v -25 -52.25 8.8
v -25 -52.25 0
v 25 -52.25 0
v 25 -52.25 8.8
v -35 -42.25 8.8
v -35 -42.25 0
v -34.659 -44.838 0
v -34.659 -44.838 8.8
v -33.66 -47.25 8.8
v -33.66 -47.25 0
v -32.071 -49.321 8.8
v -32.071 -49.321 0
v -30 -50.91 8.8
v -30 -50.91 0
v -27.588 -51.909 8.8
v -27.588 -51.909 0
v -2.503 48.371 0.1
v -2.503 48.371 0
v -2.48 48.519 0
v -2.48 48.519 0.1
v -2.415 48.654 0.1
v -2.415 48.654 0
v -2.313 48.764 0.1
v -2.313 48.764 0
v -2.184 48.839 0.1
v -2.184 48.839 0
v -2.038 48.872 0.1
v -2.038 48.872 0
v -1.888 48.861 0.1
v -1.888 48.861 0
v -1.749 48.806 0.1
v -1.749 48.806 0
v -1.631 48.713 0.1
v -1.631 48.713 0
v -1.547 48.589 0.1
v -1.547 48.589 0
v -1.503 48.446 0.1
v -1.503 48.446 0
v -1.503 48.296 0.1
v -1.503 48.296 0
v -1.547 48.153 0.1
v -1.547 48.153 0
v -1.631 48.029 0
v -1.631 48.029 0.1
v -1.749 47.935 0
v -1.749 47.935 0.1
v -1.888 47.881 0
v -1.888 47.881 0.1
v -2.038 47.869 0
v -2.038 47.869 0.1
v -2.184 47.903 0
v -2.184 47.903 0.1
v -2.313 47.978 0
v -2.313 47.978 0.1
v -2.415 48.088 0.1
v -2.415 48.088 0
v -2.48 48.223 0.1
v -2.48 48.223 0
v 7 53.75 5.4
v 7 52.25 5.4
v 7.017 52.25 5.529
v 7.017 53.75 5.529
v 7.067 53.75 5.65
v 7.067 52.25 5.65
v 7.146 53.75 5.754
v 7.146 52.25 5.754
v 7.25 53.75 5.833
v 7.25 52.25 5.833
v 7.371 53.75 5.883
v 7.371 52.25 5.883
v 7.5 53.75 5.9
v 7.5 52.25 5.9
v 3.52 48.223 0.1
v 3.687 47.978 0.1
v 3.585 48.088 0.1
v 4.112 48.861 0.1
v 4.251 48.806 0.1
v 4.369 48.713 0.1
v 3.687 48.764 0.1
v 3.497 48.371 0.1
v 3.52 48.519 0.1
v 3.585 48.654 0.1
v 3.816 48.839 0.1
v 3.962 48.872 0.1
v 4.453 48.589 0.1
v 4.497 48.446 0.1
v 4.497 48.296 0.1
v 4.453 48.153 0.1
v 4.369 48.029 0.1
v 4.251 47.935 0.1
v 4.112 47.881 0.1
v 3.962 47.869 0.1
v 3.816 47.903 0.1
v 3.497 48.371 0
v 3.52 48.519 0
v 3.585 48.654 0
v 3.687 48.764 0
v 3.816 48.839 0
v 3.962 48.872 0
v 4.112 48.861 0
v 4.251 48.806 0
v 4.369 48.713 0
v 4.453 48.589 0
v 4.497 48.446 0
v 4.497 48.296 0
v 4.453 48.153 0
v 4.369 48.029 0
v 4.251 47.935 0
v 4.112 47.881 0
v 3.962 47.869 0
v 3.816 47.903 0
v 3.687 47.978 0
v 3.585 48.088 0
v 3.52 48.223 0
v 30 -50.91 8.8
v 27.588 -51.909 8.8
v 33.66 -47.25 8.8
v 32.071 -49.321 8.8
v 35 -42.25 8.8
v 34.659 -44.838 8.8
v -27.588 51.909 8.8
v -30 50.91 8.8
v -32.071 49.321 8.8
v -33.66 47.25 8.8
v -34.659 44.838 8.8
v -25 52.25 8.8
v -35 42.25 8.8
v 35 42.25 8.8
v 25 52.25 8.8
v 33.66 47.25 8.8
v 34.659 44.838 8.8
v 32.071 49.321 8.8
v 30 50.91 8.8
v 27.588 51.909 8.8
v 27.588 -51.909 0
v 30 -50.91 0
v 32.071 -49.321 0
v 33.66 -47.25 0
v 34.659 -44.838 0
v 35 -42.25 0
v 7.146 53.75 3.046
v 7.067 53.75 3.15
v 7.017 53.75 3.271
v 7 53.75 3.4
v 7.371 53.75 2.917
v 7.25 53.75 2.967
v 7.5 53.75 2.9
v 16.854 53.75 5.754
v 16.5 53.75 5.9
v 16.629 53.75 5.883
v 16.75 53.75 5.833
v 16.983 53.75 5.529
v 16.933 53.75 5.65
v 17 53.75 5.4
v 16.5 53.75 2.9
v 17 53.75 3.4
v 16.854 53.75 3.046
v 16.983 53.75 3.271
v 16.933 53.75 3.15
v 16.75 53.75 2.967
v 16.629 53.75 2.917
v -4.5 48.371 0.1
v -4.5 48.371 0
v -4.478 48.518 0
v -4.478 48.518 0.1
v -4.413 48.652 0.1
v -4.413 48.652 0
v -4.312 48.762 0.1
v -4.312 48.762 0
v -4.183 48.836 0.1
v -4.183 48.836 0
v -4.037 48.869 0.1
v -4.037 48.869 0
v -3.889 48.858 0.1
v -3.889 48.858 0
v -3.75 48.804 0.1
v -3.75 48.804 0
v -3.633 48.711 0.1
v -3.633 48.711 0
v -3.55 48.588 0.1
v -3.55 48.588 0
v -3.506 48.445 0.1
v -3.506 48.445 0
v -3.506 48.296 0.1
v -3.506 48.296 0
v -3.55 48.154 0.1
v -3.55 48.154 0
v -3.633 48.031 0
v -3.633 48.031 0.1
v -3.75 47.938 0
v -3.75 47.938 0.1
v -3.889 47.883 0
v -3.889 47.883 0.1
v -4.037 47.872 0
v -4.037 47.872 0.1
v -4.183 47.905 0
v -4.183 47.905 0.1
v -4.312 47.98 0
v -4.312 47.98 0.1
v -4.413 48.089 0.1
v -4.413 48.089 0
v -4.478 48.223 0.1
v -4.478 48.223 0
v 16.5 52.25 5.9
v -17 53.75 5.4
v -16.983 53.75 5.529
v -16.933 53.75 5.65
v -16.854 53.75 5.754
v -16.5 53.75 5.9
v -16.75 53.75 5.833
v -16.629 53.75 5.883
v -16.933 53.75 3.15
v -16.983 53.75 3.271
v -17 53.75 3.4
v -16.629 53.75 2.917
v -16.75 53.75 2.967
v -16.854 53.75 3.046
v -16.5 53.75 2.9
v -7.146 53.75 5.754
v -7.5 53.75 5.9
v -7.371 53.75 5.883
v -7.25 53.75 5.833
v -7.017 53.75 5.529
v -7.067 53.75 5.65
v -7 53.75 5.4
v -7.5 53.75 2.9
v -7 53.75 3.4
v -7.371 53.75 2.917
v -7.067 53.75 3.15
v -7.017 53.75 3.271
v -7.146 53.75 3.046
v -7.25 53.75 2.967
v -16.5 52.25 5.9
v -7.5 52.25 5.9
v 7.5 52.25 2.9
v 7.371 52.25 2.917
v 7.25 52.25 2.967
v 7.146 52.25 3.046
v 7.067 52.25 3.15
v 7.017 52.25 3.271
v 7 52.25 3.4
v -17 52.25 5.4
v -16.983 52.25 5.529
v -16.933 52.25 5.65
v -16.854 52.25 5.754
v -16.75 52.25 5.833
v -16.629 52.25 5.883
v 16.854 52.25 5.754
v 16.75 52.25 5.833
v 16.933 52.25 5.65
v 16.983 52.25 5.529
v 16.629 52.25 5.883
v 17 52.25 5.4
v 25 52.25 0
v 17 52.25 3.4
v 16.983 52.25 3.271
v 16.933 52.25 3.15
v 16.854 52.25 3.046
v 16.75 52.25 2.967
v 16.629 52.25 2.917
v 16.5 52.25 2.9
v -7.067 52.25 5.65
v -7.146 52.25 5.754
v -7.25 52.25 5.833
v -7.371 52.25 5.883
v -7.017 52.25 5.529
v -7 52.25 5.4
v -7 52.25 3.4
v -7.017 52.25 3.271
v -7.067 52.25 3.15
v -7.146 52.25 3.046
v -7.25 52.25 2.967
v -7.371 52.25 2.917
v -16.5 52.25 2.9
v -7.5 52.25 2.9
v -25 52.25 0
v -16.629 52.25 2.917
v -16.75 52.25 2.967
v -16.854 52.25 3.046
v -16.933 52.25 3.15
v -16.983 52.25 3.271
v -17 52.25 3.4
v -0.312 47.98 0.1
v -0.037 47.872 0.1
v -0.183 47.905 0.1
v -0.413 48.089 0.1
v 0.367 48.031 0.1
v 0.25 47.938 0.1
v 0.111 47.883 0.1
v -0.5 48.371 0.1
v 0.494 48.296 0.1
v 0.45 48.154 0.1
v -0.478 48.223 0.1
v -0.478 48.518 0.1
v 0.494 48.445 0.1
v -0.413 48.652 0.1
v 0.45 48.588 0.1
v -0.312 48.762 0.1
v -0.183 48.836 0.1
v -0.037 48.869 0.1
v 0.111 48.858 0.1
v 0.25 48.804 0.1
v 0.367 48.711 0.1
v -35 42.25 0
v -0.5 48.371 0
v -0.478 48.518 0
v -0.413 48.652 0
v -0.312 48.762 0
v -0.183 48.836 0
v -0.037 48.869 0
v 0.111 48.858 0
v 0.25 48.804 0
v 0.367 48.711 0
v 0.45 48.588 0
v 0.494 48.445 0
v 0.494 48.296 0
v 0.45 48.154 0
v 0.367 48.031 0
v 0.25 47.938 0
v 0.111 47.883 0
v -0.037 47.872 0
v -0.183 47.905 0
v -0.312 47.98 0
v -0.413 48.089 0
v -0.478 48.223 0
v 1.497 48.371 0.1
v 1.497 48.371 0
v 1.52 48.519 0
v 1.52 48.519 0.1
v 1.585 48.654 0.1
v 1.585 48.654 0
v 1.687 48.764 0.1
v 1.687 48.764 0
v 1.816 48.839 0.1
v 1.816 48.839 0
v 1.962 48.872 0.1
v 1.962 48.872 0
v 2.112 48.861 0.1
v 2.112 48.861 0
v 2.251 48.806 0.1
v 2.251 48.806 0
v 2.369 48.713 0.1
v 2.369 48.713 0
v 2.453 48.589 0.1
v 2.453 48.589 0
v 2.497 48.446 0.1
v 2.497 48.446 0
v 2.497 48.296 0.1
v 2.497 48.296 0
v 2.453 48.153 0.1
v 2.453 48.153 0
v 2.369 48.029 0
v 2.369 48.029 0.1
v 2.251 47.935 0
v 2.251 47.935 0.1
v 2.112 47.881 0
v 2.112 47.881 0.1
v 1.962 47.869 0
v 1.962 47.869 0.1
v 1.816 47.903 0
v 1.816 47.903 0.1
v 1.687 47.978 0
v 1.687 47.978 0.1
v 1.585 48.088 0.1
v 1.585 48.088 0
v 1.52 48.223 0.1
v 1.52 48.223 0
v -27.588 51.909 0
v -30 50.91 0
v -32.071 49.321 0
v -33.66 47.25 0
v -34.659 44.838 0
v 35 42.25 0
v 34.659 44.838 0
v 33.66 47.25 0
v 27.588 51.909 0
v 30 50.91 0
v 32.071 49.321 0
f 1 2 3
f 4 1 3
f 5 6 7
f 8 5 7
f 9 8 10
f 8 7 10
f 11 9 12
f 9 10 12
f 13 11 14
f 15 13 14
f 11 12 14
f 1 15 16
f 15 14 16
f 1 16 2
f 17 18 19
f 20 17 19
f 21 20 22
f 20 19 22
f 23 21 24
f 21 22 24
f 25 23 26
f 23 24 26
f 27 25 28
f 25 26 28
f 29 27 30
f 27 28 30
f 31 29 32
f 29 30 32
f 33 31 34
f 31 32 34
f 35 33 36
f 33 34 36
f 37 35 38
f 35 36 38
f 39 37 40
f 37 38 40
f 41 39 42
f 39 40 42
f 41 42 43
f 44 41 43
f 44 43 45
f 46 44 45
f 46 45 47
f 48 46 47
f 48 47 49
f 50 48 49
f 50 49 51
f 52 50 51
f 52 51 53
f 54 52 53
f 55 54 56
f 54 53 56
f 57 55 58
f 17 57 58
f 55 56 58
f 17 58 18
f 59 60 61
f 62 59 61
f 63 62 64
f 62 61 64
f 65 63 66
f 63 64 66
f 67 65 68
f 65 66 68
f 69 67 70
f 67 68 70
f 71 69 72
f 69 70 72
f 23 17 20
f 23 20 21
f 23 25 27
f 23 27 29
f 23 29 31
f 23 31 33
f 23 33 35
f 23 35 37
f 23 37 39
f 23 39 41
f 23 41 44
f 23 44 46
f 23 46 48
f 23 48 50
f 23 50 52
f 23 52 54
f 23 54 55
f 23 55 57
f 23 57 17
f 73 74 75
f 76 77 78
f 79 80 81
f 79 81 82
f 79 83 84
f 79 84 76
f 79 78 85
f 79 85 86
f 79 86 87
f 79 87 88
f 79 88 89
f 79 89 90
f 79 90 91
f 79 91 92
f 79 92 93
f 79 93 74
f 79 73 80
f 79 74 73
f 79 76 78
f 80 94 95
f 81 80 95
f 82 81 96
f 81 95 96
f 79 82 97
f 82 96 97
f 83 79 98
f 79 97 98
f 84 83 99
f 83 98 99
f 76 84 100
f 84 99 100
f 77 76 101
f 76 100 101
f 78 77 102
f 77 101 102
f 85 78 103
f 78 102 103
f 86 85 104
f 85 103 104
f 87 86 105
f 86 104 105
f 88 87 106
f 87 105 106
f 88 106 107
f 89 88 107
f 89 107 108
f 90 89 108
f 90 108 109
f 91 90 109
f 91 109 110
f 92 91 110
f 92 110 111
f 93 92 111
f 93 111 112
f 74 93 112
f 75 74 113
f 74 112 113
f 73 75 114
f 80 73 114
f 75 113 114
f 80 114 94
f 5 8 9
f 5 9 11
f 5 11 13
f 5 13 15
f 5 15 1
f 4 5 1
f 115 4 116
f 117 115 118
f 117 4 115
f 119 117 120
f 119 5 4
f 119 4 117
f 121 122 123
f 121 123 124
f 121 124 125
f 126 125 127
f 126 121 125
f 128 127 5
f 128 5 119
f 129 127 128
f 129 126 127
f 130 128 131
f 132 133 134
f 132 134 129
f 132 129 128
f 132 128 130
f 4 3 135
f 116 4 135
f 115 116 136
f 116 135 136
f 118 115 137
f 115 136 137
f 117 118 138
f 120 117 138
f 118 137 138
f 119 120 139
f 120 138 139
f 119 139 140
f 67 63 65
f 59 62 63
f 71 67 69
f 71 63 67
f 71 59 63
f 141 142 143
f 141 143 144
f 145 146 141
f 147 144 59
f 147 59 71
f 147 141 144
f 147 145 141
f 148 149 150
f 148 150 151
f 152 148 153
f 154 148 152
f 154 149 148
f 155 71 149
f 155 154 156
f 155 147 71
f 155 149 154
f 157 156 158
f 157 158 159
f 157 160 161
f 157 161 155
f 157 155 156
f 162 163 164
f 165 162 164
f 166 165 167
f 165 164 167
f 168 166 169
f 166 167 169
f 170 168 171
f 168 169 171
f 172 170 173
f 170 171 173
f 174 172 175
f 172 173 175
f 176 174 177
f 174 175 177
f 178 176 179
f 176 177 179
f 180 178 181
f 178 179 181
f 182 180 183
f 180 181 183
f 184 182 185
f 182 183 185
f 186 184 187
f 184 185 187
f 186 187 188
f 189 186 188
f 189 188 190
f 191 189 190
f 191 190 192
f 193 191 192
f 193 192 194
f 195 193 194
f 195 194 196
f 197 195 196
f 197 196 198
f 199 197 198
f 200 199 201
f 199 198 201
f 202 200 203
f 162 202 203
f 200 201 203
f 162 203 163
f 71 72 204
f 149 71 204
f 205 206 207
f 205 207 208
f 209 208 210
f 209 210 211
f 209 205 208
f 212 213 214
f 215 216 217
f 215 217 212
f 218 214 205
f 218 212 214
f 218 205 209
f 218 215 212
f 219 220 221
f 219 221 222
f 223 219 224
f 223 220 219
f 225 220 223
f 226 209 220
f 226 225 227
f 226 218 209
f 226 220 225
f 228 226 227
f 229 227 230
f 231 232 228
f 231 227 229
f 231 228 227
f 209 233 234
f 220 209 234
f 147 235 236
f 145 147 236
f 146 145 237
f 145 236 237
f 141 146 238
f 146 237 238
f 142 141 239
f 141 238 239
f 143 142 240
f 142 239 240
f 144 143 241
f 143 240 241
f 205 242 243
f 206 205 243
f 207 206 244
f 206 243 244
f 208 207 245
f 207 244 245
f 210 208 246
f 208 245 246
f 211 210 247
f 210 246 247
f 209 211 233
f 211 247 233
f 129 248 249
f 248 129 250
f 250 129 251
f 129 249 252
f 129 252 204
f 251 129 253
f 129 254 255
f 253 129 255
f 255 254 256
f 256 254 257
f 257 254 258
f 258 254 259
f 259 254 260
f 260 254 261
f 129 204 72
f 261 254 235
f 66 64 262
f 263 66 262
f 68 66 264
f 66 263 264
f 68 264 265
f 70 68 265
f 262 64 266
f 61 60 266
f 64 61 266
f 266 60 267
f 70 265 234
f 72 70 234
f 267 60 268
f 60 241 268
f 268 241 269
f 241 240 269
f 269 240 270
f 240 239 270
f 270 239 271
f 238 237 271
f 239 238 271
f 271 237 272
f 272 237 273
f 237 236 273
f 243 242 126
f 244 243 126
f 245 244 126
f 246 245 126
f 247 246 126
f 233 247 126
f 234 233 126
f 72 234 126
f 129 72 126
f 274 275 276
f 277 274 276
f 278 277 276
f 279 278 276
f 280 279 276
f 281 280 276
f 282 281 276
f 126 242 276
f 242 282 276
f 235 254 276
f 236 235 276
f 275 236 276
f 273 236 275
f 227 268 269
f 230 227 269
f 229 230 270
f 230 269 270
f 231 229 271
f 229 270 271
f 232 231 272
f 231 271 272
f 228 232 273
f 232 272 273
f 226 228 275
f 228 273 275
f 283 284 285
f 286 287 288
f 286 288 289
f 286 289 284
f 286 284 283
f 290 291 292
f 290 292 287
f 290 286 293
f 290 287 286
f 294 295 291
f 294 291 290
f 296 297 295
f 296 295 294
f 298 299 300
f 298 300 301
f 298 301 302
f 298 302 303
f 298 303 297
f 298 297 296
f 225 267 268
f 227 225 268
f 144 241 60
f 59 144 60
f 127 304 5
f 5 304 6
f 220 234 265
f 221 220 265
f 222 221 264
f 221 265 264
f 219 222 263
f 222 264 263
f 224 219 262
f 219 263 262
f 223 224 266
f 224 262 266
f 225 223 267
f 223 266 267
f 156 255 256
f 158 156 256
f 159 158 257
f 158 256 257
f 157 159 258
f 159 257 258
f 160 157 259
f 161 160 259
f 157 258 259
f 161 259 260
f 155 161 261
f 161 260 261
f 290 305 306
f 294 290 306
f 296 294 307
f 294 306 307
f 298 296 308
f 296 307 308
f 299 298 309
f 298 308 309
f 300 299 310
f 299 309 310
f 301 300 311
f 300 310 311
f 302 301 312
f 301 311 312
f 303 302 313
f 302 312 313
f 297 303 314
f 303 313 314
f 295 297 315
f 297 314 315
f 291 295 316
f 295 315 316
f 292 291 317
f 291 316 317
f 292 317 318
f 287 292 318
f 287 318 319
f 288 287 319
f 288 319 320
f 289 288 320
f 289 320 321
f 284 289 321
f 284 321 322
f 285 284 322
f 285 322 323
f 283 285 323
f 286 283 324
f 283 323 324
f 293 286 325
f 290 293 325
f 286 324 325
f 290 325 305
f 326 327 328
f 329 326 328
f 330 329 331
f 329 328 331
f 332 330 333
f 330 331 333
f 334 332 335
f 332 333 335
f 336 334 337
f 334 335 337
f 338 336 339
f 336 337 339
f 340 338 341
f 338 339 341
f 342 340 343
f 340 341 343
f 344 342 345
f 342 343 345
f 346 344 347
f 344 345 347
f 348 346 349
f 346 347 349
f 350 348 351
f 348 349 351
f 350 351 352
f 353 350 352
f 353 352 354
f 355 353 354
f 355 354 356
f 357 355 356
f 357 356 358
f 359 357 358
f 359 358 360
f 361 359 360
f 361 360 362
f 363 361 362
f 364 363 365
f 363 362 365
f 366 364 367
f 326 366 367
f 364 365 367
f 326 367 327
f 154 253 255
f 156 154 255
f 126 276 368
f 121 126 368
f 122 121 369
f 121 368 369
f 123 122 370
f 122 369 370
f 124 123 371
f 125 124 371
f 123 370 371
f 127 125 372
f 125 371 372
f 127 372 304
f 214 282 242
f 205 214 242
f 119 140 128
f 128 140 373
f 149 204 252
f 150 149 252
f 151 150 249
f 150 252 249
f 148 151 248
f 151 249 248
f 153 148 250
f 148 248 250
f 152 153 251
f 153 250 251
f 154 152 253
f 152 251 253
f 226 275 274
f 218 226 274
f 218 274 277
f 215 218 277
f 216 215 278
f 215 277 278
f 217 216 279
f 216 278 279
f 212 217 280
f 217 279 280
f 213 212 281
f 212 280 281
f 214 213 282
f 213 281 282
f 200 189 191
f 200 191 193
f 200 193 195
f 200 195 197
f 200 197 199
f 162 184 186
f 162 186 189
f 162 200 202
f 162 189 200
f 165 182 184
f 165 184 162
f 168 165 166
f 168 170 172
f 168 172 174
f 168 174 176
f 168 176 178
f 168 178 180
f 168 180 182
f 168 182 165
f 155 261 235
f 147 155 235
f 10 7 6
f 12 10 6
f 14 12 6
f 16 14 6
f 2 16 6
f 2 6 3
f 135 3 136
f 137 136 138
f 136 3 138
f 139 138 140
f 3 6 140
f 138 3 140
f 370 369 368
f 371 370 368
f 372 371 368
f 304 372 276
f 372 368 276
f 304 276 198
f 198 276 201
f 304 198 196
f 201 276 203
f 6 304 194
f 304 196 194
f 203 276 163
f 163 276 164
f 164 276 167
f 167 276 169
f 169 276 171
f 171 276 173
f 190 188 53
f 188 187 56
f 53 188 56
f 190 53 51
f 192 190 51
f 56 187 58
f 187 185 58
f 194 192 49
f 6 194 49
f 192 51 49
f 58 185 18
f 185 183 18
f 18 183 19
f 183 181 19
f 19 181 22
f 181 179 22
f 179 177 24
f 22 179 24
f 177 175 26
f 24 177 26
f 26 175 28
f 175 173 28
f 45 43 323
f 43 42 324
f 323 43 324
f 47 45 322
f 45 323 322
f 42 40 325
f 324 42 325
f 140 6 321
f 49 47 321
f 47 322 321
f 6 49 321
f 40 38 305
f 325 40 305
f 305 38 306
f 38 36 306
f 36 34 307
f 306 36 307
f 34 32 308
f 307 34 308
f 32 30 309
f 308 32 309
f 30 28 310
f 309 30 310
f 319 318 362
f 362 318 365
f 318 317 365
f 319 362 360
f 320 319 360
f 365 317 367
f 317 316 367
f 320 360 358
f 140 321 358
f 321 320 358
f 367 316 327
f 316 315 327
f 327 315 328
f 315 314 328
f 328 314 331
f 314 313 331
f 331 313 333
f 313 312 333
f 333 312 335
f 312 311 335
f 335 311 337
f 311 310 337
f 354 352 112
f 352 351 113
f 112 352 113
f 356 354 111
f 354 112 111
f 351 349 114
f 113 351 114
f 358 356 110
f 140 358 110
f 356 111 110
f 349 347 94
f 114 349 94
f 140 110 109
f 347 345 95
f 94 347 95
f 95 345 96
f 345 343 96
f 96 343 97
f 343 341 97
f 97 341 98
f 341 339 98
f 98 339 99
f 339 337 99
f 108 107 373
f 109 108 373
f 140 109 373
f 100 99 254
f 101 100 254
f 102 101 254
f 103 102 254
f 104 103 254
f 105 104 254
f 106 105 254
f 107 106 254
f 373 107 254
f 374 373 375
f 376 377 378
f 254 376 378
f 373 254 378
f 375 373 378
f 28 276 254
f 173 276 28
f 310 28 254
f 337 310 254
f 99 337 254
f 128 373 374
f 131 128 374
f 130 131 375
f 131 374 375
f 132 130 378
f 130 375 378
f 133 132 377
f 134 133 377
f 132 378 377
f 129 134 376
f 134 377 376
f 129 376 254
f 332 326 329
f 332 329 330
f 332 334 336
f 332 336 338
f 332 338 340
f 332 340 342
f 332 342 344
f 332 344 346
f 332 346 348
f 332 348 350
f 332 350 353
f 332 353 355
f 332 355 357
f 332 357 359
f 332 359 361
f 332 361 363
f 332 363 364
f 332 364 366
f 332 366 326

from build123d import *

# Parameters (mm, degrees)
EXTRUDE_1_DEPTH     = 8.8
EXTRUDE_2_DEPTH     = 1.5
SKETCH_3_R          = 0.5
SKETCH_3_R_2        = 0.502704905
CUT_EXTRUDE_1_DEPTH = 0.1


with BuildPart() as part:
    # 草圖1 → 填料-伸長1 (new body)
    with BuildSketch(Plane.XY):
        with BuildLine():
            Line((-25, -52.25), (25, -52.25))
            ThreePointArc((25, -52.25), (32.071067812, -49.321067812), (35, -42.25))
            Line((35, -42.25), (35, 42.25))
            ThreePointArc((35, 42.25), (32.071067812, 49.321067812), (25, 52.25))
            Line((25, 52.25), (-25, 52.25))
            ThreePointArc((-25, 52.25), (-32.071067812, 49.321067812), (-35, 42.25))
            Line((-35, 42.25), (-35, -42.25))
            ThreePointArc((-35, -42.25), (-32.071067812, -49.321067812), (-25, -52.25))
        make_face()
    extrude(amount=EXTRUDE_1_DEPTH)

    # 草圖2 → 填料-伸長2 (add)
    with BuildSketch(Plane(origin=(0, 52.25, 0), x_dir=(1, 0, 0), z_dir=(0, 1, 0))):
        with BuildLine():
            Line((-16.5, -5.9), (-7.5, -5.9))
            ThreePointArc((-7.5, -5.9), (-7.146446609, -5.753553391), (-7, -5.4))
            Line((-7, -5.4), (-7, -3.4))
            ThreePointArc((-7, -3.4), (-7.146446609, -3.046446609), (-7.5, -2.9))
            Line((-7.5, -2.9), (-16.5, -2.9))
            ThreePointArc((-16.5, -2.9), (-16.853553391, -3.046446609), (-17, -3.4))
            Line((-17, -3.4), (-17, -5.4))
            ThreePointArc((-17, -5.4), (-16.853553391, -5.753553391), (-16.5, -5.9))
        make_face()
        with BuildLine():
            Line((7.5, -5.9), (16.5, -5.9))
            ThreePointArc((16.5, -5.9), (16.853553391, -5.753553391), (17, -5.4))
            Line((17, -5.4), (17, -3.4))
            ThreePointArc((17, -3.4), (16.853553391, -3.046446609), (16.5, -2.9))
            Line((16.5, -2.9), (7.5, -2.9))
            ThreePointArc((7.5, -2.9), (7.146446609, -3.046446609), (7, -3.4))
            Line((7, -3.4), (7, -5.4))
            ThreePointArc((7, -5.4), (7.146446609, -5.753553391), (7.5, -5.9))
        make_face()
    extrude(amount=EXTRUDE_2_DEPTH)

    # 草圖3 → 除料-伸長1 (cut)
    with BuildSketch(Plane(origin=(0, 0, 0), x_dir=(-1, 0, 0), z_dir=(0, 0, -1))):
        with Locations((0, 48.370695597)):
            Circle(SKETCH_3_R)
        with Locations((-2, 48.370695597)):
            Circle(SKETCH_3_R_2)
        with Locations((4, 48.370695597)):
            Circle(SKETCH_3_R)
        with Locations((2, 48.370695597)):
            Circle(SKETCH_3_R_2)
        with Locations((-4, 48.370695597)):
            Circle(SKETCH_3_R_2)
    extrude(amount=-CUT_EXTRUDE_1_DEPTH, mode=Mode.SUBTRACT)


solid = part.part
